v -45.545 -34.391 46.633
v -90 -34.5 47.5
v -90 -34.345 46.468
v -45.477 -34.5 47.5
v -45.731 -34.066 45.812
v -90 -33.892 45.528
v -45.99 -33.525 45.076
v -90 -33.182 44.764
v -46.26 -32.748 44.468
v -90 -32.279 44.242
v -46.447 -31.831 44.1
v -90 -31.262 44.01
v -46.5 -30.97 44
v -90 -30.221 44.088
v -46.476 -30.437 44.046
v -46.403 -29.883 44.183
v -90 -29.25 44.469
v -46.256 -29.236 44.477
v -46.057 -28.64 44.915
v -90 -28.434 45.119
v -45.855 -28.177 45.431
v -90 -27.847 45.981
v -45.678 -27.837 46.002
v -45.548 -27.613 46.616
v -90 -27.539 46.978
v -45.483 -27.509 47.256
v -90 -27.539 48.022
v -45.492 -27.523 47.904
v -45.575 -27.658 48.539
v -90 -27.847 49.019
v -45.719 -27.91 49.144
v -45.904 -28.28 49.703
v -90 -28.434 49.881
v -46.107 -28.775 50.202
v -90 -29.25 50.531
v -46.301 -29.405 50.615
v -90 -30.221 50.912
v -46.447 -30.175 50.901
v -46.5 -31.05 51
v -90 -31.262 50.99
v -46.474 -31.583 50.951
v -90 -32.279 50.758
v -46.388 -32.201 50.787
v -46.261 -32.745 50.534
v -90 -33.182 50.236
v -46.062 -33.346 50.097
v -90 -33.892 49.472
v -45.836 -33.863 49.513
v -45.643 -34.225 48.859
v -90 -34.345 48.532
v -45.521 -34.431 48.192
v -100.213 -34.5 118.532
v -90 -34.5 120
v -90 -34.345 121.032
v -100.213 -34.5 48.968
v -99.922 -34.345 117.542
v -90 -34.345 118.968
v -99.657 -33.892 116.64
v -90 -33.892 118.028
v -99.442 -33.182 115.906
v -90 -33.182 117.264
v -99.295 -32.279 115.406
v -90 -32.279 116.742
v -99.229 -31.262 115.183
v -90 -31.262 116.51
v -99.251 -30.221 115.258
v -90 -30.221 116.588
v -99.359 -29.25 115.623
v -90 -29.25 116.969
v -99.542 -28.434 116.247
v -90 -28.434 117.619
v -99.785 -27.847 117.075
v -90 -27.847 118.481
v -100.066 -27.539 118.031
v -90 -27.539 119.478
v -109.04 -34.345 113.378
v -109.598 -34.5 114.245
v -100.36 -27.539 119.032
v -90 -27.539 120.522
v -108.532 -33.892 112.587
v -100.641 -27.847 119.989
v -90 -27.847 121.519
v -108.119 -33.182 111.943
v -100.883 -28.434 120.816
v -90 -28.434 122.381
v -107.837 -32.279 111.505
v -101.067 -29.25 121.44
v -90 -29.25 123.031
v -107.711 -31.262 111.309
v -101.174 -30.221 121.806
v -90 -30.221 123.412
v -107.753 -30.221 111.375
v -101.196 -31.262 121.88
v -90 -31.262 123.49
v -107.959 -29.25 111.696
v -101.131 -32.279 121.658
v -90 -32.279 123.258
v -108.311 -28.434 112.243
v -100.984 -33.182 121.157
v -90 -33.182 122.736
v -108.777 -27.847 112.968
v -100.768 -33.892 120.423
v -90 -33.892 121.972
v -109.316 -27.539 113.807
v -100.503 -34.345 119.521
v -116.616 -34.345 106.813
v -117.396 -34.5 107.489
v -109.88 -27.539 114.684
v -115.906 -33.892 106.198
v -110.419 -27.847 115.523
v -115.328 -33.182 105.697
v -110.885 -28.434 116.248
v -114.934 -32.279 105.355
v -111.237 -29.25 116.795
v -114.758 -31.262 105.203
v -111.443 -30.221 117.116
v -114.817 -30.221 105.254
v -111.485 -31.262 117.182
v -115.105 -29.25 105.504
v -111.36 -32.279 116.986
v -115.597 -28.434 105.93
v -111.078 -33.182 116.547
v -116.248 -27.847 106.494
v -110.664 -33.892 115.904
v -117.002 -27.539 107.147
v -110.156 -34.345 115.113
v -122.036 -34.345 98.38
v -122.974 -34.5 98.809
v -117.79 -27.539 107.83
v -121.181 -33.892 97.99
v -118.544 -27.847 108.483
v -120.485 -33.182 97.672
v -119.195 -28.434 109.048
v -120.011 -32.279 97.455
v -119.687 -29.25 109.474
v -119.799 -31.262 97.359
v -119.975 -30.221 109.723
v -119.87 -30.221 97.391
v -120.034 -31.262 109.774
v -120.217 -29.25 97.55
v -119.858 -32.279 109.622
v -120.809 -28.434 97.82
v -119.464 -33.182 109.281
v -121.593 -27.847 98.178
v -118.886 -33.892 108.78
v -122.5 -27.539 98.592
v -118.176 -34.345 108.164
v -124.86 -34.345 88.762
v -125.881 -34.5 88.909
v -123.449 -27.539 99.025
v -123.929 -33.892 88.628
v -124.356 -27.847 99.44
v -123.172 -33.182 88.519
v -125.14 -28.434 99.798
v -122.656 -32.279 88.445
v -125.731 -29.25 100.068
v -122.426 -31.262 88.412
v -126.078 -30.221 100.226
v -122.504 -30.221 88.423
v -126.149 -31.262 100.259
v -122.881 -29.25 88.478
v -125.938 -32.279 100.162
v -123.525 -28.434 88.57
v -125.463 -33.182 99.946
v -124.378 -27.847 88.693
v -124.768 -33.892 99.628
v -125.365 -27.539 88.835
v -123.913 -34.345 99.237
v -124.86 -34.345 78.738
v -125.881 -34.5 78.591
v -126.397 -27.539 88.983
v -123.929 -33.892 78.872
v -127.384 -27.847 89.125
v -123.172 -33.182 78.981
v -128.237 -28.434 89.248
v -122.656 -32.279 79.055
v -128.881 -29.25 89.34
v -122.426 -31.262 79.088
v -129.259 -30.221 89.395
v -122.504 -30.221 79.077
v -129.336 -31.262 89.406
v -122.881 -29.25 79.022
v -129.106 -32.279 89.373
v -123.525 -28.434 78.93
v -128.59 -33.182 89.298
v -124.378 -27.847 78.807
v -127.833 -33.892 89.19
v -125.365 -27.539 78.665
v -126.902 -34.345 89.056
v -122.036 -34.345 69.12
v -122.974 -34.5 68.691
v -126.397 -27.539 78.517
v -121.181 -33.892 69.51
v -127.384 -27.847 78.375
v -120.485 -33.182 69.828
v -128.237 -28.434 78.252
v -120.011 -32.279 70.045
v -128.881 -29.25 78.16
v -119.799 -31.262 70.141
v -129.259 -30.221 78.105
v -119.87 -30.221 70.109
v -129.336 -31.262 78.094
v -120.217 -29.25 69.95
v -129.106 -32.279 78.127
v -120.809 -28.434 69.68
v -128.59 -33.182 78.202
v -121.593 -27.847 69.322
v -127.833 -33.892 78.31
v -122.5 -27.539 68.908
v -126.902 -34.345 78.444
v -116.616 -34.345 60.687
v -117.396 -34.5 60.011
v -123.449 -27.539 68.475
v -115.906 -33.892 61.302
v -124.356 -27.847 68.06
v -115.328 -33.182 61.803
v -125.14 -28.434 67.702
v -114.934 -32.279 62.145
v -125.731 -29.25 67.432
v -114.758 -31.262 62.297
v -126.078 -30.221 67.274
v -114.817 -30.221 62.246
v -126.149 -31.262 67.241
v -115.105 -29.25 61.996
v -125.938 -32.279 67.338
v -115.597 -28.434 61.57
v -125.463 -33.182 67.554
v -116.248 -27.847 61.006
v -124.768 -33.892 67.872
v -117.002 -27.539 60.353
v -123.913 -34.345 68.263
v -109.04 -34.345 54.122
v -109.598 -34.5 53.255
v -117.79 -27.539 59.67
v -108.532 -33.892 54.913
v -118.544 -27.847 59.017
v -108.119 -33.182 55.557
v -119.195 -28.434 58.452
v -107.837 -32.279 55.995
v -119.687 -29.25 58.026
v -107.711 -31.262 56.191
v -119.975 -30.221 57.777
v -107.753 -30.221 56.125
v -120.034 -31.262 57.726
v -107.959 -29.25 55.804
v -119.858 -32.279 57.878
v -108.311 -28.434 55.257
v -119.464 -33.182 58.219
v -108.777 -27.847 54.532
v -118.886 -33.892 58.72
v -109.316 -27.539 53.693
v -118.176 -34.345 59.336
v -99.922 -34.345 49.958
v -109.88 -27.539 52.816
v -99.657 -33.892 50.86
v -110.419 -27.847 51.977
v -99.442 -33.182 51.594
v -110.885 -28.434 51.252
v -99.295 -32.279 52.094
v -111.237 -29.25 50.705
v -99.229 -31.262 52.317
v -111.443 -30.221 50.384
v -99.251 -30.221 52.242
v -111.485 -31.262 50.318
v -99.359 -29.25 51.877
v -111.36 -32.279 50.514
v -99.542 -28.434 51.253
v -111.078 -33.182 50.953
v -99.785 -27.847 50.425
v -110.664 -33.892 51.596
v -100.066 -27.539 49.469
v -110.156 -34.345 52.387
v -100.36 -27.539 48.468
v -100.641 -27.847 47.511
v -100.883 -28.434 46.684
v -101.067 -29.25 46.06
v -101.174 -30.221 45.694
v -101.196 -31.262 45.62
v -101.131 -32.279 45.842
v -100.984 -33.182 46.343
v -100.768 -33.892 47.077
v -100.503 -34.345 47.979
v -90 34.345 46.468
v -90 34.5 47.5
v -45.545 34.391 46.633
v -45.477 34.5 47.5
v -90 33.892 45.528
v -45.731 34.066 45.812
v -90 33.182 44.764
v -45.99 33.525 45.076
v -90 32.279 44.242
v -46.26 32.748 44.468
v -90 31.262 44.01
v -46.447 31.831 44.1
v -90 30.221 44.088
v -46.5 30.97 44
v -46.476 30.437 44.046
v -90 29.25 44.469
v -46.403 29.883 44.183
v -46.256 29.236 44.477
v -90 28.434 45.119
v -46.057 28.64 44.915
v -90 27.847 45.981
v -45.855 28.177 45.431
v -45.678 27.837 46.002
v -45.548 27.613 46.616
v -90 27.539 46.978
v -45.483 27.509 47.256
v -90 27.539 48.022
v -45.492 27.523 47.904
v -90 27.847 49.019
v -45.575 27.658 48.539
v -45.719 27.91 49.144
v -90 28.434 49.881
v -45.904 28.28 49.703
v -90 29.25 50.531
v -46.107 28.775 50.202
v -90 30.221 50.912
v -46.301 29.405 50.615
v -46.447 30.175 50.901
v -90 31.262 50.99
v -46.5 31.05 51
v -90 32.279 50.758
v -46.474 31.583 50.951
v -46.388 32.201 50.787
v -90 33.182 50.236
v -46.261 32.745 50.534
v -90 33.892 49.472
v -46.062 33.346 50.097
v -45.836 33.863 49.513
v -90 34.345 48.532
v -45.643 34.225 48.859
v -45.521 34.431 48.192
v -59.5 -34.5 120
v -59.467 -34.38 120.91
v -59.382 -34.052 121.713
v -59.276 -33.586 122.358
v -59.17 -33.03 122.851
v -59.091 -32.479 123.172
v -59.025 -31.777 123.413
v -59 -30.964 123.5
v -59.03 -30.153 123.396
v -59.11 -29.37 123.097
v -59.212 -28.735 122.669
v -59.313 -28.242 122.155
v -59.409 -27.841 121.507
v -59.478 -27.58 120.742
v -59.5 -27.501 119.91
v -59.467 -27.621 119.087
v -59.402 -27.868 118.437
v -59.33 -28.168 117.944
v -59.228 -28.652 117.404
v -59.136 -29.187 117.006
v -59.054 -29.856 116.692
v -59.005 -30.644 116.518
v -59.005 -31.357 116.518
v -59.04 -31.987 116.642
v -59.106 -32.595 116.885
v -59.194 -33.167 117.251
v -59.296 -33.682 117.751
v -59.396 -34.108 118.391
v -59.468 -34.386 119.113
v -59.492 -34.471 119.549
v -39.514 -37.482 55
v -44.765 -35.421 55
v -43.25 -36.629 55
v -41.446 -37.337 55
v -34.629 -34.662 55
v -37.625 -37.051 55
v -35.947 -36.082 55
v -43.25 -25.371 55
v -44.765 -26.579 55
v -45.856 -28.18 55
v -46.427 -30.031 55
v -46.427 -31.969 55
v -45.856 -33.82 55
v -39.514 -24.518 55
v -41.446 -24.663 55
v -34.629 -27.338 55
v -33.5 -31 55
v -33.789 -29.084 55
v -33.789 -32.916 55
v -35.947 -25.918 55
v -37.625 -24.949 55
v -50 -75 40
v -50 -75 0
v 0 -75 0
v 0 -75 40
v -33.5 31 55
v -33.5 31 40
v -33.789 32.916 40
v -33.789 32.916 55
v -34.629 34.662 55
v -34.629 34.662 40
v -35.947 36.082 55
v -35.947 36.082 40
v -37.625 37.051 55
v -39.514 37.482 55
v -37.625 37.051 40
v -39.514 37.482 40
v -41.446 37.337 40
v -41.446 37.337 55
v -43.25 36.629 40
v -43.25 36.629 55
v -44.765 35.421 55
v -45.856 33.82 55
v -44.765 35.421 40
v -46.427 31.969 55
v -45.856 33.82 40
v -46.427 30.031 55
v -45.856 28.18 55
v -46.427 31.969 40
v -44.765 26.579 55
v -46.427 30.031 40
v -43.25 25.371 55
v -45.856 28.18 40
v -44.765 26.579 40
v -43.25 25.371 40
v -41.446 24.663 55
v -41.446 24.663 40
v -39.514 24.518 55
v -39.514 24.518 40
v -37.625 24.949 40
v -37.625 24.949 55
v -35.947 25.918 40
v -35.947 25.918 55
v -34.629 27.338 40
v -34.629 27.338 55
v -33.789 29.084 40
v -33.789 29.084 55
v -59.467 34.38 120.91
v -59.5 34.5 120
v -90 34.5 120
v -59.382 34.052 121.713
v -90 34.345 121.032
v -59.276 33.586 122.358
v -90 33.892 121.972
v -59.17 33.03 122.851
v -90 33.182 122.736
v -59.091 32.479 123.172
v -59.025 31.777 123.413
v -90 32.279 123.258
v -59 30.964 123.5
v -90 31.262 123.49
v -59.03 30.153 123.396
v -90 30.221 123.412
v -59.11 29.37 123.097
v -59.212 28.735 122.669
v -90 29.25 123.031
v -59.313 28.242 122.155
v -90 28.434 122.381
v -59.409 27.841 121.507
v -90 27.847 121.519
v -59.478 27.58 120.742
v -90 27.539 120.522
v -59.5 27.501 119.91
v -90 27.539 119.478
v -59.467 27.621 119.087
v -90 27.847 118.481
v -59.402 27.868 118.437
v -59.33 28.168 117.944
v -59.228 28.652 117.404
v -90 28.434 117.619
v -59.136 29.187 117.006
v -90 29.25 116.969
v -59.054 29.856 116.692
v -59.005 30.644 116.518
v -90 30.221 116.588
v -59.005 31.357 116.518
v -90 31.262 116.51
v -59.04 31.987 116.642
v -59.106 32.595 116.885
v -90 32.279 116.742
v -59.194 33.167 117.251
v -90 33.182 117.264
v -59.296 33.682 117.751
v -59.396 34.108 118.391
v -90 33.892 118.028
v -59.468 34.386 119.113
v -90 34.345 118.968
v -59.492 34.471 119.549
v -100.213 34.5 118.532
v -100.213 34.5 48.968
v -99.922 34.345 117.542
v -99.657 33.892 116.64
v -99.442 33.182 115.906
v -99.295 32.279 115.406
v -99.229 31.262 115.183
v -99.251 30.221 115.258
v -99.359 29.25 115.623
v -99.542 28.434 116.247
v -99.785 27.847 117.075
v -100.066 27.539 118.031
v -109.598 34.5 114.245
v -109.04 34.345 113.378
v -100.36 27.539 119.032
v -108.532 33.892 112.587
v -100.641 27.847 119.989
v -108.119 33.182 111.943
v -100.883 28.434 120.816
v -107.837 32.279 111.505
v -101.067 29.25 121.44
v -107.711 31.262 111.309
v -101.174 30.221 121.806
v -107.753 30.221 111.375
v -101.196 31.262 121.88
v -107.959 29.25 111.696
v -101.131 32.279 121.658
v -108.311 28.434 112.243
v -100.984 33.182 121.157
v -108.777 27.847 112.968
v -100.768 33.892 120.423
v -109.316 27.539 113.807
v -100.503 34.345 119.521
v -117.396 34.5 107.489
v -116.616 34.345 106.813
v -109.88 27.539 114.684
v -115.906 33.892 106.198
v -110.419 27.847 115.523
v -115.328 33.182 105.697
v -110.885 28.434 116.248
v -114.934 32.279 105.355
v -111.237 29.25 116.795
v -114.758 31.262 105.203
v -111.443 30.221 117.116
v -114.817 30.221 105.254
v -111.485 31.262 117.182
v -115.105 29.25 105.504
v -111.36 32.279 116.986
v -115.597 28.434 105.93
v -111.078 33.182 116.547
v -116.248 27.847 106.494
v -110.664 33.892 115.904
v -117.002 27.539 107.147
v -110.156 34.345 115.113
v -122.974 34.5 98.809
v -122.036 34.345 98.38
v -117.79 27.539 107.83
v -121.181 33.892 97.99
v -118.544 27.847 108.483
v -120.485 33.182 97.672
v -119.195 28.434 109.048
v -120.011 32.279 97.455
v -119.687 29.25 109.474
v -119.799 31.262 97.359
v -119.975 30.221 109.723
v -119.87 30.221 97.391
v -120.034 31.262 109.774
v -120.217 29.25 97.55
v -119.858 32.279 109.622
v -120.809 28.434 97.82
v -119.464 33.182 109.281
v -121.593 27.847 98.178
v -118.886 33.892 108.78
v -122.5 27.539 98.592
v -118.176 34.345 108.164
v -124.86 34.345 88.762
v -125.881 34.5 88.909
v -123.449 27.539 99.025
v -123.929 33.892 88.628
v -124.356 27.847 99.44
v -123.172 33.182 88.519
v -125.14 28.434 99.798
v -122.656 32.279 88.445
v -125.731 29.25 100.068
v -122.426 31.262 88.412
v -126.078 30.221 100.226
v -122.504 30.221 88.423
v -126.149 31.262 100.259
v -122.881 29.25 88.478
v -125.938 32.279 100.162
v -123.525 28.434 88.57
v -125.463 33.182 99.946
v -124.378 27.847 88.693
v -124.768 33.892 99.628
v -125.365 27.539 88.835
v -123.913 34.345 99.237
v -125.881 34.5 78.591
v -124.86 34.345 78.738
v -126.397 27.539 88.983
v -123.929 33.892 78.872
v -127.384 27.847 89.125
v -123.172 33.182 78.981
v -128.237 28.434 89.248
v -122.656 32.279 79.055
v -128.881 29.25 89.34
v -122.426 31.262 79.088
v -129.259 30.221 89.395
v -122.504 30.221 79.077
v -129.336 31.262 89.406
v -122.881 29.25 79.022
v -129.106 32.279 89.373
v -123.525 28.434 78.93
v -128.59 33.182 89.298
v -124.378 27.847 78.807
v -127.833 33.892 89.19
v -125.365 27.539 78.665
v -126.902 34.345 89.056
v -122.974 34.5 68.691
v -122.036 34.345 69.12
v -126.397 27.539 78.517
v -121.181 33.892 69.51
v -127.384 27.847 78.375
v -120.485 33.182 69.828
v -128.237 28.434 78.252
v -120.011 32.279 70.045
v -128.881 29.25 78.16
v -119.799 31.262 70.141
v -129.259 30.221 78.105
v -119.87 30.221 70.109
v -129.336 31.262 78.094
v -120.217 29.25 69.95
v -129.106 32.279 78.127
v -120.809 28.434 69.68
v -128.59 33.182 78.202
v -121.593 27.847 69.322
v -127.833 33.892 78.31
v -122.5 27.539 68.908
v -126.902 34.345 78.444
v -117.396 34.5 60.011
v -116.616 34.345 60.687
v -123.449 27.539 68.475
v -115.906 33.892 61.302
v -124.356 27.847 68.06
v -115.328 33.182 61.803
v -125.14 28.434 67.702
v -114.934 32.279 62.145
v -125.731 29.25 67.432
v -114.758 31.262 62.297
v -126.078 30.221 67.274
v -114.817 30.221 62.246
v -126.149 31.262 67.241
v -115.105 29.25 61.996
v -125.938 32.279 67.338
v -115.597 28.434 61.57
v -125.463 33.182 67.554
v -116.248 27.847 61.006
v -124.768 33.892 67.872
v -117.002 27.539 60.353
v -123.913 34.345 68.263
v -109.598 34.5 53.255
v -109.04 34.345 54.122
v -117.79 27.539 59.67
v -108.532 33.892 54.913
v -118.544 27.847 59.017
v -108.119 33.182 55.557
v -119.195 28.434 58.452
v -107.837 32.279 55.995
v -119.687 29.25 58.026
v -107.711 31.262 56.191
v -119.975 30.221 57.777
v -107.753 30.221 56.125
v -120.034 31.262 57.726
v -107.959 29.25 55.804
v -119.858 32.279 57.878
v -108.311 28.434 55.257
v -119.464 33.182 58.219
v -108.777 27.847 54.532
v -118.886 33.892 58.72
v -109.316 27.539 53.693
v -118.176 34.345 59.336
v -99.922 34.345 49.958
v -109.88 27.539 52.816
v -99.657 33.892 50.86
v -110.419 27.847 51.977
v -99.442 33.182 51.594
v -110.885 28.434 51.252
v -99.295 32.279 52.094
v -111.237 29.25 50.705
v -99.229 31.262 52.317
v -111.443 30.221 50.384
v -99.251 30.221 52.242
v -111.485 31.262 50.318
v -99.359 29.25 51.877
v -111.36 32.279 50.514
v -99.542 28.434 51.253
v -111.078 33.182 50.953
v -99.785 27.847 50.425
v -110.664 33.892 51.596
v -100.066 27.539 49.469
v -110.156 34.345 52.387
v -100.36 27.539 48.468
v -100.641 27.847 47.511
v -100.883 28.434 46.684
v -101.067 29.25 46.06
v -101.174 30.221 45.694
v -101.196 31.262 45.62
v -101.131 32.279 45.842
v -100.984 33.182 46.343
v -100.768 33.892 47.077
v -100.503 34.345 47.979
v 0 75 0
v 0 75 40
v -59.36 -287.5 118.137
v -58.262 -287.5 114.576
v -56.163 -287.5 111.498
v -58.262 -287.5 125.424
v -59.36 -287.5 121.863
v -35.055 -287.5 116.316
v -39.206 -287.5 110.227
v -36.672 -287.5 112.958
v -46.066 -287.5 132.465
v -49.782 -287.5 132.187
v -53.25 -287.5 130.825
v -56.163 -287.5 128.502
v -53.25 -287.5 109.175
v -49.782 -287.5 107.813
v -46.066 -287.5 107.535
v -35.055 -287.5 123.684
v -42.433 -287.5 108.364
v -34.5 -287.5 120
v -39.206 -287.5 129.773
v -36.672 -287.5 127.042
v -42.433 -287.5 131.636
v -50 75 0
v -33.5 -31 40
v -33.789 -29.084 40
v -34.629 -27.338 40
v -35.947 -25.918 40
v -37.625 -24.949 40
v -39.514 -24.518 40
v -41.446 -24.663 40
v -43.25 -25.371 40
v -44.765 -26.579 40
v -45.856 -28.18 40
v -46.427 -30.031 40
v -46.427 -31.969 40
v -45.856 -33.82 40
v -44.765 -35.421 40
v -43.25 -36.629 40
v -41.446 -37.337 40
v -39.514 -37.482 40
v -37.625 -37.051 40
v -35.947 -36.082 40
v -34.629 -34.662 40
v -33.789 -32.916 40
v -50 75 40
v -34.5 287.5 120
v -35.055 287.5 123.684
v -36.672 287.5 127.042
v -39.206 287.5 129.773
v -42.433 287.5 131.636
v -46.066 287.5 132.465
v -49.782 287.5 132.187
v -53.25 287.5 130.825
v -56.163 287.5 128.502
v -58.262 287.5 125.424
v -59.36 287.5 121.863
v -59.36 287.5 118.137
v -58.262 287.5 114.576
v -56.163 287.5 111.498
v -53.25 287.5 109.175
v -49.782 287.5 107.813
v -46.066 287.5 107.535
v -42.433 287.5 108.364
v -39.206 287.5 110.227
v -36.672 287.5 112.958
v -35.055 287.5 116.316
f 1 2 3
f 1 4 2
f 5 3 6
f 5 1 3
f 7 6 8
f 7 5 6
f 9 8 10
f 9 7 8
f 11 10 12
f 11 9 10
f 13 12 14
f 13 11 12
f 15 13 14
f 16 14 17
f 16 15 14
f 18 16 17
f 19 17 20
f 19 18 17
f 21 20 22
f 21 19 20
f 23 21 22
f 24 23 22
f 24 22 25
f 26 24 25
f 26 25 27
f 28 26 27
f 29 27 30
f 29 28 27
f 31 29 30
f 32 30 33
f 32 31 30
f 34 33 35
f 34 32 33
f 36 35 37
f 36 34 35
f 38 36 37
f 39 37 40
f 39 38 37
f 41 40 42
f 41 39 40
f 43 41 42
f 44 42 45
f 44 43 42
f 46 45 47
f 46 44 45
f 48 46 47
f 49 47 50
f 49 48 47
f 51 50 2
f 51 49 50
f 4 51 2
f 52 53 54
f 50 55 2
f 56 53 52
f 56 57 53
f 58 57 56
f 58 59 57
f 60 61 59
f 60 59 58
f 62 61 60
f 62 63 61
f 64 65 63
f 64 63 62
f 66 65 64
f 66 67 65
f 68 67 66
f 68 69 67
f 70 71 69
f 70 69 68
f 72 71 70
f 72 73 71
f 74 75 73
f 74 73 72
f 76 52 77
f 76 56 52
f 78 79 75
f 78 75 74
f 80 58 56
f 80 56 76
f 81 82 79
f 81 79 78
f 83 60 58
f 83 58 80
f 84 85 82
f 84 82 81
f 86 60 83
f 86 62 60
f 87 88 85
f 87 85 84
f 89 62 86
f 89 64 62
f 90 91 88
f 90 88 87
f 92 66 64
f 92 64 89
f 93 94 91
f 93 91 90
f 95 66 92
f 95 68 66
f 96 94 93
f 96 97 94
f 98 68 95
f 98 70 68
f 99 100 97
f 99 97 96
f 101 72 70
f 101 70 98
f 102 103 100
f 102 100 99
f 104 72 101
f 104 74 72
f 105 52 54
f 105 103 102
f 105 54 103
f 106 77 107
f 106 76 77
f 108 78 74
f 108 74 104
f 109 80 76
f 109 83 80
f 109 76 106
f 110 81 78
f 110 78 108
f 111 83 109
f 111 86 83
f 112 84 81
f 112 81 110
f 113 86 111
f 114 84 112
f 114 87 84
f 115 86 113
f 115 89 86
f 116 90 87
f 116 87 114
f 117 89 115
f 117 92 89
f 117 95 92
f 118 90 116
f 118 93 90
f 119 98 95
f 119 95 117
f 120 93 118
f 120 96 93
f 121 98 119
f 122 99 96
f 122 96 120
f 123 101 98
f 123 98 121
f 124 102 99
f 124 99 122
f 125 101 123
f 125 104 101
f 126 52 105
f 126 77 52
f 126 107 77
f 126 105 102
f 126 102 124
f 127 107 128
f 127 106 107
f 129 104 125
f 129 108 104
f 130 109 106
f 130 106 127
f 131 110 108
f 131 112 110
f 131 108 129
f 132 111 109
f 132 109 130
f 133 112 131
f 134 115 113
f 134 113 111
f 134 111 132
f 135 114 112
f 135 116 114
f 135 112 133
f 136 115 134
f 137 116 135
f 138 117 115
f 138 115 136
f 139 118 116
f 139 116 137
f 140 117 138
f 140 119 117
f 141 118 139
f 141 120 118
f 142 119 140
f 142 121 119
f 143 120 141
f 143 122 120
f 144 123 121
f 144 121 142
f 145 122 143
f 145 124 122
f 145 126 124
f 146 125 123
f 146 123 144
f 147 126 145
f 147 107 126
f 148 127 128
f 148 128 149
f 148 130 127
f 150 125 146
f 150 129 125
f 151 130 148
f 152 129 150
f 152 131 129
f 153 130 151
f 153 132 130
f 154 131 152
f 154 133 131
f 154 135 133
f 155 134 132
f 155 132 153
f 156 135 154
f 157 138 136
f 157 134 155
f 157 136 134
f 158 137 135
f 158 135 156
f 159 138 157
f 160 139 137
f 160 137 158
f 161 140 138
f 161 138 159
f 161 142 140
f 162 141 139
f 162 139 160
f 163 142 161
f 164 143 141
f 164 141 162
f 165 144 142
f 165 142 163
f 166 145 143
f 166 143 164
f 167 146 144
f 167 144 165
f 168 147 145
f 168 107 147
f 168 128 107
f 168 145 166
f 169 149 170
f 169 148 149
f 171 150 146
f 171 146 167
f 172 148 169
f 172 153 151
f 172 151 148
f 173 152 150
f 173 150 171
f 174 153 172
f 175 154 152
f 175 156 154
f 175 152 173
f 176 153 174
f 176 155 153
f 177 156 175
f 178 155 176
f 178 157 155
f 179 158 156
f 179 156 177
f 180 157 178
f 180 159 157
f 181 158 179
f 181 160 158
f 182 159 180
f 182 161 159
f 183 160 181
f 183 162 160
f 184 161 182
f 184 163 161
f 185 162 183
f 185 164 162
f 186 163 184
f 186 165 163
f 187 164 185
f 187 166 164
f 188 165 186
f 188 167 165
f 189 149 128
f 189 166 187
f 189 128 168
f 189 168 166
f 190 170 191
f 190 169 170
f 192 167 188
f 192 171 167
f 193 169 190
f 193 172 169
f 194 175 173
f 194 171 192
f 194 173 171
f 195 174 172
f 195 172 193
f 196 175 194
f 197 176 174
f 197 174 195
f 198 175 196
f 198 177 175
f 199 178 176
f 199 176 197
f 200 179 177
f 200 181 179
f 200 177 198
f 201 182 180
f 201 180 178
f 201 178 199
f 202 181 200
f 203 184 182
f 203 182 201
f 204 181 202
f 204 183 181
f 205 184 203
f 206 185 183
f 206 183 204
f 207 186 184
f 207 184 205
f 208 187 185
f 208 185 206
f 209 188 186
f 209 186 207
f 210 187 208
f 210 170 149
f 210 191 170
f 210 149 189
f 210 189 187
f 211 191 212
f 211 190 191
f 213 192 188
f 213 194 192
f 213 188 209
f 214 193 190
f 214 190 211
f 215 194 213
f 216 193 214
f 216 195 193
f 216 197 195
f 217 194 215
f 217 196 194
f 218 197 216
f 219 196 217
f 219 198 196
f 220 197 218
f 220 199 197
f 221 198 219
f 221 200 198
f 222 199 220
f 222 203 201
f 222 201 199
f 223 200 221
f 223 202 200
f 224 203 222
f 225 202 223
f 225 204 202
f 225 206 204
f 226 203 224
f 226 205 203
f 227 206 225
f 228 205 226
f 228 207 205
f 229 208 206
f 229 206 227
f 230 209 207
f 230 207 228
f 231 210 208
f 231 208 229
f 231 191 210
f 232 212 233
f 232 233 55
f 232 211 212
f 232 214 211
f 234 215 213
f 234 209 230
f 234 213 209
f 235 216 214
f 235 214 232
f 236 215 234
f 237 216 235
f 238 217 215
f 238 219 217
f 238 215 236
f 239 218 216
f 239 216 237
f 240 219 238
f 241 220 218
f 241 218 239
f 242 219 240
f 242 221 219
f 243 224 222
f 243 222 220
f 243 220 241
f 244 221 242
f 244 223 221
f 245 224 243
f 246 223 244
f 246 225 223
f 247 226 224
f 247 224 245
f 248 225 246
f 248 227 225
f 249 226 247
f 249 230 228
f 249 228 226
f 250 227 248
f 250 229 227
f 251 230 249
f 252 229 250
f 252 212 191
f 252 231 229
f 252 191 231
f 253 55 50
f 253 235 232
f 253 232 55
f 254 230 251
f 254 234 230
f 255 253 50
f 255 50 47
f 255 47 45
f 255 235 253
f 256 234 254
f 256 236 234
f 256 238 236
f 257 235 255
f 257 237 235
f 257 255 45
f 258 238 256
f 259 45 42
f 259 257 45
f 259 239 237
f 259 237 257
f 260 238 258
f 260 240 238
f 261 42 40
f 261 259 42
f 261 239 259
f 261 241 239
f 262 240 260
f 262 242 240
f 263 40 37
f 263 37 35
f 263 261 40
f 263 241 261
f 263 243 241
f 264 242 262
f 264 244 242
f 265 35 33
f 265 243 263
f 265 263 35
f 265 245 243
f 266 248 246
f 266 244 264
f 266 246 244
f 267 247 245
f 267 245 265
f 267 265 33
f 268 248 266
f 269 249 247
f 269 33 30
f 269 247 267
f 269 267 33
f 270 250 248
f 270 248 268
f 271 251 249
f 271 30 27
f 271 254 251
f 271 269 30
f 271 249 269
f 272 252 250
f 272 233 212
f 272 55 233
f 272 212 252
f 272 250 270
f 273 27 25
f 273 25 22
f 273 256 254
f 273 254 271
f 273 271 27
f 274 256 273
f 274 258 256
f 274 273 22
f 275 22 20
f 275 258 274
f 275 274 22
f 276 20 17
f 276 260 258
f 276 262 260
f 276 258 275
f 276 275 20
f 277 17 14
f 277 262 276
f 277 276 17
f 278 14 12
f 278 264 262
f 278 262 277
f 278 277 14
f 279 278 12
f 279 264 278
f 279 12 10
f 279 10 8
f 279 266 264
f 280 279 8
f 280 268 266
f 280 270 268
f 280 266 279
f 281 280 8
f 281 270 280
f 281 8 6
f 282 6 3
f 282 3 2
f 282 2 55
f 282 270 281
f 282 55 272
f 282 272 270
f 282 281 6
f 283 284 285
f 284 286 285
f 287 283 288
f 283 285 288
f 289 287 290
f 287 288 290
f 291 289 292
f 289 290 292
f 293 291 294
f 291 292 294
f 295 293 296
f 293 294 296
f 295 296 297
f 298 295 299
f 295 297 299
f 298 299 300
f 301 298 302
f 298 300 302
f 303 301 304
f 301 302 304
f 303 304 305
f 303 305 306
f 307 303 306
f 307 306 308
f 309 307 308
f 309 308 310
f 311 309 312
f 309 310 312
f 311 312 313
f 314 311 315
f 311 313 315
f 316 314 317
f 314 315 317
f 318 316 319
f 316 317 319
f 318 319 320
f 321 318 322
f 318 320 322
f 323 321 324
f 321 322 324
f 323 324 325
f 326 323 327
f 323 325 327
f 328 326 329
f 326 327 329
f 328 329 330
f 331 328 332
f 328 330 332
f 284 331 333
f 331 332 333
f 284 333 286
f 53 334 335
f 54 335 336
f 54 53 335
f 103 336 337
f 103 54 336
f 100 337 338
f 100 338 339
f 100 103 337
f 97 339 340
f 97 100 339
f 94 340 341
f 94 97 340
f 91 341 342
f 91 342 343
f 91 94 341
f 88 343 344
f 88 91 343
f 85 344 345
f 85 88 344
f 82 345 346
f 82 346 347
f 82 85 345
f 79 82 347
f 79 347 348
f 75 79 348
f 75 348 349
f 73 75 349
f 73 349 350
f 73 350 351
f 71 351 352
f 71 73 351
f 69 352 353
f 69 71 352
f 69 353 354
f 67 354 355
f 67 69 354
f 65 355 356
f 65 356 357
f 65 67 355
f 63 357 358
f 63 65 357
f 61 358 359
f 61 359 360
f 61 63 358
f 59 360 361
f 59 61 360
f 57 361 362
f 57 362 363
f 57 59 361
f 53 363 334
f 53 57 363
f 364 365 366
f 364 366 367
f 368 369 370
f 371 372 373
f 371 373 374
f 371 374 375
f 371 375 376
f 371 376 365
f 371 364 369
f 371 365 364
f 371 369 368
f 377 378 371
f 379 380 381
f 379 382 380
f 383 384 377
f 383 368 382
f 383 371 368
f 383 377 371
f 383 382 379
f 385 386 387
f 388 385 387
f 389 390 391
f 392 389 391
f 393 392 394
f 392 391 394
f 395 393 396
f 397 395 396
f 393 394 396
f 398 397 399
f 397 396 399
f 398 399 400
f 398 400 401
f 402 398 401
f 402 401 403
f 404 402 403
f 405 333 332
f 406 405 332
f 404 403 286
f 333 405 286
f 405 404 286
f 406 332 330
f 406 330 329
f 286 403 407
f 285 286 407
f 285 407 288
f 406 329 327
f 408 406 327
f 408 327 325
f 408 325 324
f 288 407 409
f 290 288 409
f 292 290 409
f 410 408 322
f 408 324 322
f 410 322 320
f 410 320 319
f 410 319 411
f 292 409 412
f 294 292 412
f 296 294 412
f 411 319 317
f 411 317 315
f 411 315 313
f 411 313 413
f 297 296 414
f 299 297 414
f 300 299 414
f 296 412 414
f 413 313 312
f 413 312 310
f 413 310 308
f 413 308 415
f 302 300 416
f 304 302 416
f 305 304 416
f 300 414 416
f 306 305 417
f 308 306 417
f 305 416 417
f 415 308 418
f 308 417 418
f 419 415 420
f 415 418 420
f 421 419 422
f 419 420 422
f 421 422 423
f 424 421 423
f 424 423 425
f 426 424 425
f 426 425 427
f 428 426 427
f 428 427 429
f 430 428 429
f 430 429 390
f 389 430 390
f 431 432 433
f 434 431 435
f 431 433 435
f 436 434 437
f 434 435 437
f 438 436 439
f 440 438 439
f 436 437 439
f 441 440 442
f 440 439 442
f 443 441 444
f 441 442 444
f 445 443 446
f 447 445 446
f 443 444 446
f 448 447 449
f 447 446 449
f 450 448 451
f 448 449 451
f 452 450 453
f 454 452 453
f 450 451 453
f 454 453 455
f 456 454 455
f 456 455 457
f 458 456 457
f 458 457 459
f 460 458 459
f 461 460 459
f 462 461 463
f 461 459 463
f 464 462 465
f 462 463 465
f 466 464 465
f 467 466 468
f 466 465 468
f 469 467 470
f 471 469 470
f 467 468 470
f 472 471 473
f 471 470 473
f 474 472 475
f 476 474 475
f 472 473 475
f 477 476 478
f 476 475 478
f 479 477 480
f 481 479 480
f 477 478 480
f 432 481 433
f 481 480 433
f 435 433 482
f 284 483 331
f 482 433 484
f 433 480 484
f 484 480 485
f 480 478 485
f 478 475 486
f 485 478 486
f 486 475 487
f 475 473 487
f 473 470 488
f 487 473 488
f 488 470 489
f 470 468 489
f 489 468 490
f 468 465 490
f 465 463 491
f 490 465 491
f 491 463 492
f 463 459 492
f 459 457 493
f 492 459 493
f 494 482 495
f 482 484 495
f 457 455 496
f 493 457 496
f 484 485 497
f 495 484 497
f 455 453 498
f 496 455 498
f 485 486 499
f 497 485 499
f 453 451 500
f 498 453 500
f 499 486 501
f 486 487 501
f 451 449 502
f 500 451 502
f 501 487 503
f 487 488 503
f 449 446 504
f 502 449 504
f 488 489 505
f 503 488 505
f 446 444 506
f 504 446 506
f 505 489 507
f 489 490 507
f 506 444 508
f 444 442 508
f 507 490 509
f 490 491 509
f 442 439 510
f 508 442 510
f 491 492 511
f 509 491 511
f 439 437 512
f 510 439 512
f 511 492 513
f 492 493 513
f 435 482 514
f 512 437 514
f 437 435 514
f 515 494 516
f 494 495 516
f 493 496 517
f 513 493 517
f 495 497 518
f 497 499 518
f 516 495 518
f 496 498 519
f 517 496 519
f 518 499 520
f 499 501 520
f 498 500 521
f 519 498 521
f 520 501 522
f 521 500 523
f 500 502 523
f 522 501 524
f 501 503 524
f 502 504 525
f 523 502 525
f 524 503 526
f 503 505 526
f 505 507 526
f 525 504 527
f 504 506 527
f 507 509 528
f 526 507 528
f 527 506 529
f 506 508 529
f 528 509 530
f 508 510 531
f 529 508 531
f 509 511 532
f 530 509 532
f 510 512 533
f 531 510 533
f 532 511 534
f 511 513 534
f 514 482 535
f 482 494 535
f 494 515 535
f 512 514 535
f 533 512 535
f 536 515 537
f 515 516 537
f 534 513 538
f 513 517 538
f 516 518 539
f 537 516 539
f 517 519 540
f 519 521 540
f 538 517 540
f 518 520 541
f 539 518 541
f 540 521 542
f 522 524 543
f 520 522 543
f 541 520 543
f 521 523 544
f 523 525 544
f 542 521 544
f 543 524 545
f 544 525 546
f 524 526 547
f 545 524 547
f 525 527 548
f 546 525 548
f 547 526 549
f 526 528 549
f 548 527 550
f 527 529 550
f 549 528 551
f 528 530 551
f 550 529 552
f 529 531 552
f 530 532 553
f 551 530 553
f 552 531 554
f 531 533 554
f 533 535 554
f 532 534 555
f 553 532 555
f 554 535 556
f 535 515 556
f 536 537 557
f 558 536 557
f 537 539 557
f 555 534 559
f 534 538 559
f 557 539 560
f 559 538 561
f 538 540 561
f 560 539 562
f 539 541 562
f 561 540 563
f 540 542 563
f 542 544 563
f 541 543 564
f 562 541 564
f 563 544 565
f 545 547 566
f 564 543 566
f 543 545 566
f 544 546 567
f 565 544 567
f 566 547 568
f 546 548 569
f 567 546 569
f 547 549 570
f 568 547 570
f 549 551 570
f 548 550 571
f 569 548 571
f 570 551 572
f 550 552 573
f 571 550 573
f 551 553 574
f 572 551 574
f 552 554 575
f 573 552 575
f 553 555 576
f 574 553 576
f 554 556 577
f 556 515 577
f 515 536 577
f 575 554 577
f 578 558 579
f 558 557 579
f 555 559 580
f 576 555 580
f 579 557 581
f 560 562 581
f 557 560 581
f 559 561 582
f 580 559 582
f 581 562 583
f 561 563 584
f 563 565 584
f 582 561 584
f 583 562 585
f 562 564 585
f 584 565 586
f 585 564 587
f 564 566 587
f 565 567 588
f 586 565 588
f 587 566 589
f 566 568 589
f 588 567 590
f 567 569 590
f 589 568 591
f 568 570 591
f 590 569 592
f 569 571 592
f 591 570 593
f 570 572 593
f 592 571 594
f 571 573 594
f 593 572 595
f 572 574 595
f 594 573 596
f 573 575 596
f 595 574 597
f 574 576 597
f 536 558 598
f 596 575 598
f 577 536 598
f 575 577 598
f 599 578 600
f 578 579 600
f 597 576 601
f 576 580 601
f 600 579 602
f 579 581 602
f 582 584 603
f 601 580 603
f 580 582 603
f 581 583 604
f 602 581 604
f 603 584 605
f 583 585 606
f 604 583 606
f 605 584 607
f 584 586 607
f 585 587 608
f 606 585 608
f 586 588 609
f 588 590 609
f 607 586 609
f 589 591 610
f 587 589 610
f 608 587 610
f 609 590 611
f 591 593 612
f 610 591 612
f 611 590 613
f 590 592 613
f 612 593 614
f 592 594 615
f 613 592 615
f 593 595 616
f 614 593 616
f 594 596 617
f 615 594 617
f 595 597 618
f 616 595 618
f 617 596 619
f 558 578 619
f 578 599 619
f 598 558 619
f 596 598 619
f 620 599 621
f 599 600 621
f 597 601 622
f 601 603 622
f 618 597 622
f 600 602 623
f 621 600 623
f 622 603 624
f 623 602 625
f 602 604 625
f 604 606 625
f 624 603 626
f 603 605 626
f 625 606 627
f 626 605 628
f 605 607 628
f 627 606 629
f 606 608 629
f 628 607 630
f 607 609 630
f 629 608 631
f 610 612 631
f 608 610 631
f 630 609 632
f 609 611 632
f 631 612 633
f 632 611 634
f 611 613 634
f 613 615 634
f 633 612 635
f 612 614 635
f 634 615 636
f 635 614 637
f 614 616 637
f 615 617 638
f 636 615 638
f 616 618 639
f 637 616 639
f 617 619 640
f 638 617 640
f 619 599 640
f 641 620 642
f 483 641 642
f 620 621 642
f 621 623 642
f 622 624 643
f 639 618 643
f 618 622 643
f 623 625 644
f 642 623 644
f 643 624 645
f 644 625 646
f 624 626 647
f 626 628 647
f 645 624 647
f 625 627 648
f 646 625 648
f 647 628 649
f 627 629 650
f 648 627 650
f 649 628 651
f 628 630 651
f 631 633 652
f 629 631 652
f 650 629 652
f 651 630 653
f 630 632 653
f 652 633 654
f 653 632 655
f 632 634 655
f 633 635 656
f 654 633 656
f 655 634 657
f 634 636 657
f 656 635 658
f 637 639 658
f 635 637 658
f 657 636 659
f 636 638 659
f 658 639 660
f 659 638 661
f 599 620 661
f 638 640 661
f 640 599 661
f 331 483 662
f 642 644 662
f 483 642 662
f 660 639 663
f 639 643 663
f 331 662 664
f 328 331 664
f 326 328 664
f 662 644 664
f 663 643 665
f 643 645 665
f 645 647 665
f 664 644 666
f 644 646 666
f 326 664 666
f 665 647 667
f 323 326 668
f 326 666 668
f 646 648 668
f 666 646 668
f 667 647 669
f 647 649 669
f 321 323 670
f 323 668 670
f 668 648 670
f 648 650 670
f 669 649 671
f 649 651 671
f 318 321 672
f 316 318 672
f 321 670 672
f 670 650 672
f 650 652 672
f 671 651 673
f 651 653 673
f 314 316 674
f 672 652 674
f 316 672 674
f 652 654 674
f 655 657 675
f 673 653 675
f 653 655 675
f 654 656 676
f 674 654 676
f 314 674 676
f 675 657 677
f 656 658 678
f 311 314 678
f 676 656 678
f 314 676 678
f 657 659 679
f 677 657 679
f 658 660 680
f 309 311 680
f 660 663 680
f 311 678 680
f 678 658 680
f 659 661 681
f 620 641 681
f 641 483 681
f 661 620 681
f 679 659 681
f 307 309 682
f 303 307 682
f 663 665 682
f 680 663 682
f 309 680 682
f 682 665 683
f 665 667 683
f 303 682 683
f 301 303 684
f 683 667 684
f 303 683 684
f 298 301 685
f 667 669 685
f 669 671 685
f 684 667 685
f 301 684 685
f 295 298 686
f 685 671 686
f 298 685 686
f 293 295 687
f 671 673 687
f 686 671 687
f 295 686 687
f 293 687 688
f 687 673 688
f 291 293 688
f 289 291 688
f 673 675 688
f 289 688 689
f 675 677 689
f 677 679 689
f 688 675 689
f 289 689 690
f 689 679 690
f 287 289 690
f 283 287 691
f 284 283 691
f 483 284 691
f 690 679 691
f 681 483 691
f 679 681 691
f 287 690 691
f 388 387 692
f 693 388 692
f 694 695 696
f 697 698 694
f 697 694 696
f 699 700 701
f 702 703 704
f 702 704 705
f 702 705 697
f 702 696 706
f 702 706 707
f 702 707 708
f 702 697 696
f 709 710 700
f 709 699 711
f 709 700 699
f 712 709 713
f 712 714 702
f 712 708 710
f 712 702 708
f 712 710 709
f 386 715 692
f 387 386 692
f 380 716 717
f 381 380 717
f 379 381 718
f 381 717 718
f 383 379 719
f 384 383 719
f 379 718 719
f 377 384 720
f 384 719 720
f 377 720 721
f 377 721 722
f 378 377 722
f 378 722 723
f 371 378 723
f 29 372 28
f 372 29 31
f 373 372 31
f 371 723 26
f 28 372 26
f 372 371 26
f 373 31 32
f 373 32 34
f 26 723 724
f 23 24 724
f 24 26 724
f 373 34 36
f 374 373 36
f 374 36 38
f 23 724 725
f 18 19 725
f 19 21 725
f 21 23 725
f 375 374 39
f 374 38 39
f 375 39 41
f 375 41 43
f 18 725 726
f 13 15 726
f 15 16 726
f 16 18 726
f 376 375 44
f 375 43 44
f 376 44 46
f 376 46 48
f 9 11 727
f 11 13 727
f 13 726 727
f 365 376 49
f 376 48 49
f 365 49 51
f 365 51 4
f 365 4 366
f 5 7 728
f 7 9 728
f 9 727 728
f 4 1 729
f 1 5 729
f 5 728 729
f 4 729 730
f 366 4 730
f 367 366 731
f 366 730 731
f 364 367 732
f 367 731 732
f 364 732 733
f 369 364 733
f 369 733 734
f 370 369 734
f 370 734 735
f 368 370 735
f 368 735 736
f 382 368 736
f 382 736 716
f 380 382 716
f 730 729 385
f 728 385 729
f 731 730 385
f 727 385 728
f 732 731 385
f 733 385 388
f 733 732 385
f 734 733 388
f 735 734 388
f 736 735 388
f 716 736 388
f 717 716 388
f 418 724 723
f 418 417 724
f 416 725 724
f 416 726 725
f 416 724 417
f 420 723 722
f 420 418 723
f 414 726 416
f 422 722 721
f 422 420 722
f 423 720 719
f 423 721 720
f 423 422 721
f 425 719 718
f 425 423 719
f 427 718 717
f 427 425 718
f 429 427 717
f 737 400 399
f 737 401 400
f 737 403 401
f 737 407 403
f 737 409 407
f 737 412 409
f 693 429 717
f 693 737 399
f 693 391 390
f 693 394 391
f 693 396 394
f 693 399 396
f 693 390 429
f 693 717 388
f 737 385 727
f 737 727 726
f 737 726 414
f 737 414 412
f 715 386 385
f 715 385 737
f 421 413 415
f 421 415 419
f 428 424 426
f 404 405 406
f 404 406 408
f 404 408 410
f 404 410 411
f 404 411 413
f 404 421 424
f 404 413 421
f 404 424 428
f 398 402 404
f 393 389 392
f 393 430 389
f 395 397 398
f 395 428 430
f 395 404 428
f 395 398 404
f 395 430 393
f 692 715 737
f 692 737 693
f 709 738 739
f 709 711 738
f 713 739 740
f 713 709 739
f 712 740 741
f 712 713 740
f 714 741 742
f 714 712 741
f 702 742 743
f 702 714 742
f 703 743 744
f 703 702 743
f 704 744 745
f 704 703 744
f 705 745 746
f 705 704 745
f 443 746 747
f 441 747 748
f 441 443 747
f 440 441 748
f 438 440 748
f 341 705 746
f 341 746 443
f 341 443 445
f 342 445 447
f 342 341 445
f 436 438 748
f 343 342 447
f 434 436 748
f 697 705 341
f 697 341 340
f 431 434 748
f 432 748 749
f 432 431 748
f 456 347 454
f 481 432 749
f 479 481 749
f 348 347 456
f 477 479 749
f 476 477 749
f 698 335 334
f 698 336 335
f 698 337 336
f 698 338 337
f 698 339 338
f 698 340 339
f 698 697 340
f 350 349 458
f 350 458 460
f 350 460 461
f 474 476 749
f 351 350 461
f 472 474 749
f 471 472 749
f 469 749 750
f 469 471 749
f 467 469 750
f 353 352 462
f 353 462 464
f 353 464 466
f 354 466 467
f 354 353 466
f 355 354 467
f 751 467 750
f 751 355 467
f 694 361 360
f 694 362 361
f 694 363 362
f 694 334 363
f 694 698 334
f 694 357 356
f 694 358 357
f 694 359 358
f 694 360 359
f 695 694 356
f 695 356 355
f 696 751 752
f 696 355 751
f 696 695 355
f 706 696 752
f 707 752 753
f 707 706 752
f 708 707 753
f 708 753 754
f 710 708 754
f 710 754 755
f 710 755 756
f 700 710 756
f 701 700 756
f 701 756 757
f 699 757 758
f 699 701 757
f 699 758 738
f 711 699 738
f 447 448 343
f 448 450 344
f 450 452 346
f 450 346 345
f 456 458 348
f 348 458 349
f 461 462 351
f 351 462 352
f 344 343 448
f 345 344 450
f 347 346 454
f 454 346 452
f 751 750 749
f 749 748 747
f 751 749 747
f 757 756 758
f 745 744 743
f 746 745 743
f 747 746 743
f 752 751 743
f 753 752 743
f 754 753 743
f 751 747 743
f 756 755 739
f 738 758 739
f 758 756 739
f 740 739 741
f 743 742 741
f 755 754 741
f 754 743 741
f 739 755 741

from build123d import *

# Parameters (mm, degrees)
F0_W     = 50
F0_H     = 150
F1_DEPTH = 40
F2_R     = 6.5
F3_DEPTH = 15
F4_R     = 12.5
F5_DEPTH = 287.5
F9_R     = 3.5


with BuildPart() as f1:
    # F0 (on Top) → F1 (new body)
    with BuildSketch(Plane.XY):
        with Locations((-25, 0)):
            Rectangle(F0_W, F0_H)
    extrude(amount=F1_DEPTH)

    # F2 (on face) → F3 (join)
    with BuildSketch(Plane.XY.offset(40)):
        with Locations((-40, -31)):
            Circle(F2_R)
        with Locations((-40, 31)):
            Circle(F2_R)
    extrude(amount=F3_DEPTH)



with BuildPart() as f5:
    # F4 (on Front) → F5 (new body, symmetric)
    with BuildSketch(Plane.XZ):
        with Locations((-47, 120)):
            Circle(F4_R)
    extrude(amount=F5_DEPTH, both=True)


with BuildPart() as f1_1:
    add(f1.part)

    add(f5.part)  # F10 merges F5
    # F10: sweep along a path in F7
    with BuildLine(Plane.XZ.offset(31)) as f10_path:
        Line((-50, 120), (-90, 120))
        ThreePointArc((-90, 120), (-126.25, 83.75), (-90, 47.5))
        Line((-90, 47.5), (-40, 47.5))
    # F9 (on line) → F10 (sweep)
    with BuildSketch(Plane(origin=(-50, 0, 0), x_dir=(0, -1, 0), z_dir=(-1, 0, 0))):
        with Locations((31, 120)):
            Circle(F9_R)
    sweep(path=f10_path.line)

    # F11: F1 across plane


with BuildPart() as f1_2:
    add(f1_1.part)
    add(f1_1.part.mirror(Plane.XZ))


solid = f1_2.part
